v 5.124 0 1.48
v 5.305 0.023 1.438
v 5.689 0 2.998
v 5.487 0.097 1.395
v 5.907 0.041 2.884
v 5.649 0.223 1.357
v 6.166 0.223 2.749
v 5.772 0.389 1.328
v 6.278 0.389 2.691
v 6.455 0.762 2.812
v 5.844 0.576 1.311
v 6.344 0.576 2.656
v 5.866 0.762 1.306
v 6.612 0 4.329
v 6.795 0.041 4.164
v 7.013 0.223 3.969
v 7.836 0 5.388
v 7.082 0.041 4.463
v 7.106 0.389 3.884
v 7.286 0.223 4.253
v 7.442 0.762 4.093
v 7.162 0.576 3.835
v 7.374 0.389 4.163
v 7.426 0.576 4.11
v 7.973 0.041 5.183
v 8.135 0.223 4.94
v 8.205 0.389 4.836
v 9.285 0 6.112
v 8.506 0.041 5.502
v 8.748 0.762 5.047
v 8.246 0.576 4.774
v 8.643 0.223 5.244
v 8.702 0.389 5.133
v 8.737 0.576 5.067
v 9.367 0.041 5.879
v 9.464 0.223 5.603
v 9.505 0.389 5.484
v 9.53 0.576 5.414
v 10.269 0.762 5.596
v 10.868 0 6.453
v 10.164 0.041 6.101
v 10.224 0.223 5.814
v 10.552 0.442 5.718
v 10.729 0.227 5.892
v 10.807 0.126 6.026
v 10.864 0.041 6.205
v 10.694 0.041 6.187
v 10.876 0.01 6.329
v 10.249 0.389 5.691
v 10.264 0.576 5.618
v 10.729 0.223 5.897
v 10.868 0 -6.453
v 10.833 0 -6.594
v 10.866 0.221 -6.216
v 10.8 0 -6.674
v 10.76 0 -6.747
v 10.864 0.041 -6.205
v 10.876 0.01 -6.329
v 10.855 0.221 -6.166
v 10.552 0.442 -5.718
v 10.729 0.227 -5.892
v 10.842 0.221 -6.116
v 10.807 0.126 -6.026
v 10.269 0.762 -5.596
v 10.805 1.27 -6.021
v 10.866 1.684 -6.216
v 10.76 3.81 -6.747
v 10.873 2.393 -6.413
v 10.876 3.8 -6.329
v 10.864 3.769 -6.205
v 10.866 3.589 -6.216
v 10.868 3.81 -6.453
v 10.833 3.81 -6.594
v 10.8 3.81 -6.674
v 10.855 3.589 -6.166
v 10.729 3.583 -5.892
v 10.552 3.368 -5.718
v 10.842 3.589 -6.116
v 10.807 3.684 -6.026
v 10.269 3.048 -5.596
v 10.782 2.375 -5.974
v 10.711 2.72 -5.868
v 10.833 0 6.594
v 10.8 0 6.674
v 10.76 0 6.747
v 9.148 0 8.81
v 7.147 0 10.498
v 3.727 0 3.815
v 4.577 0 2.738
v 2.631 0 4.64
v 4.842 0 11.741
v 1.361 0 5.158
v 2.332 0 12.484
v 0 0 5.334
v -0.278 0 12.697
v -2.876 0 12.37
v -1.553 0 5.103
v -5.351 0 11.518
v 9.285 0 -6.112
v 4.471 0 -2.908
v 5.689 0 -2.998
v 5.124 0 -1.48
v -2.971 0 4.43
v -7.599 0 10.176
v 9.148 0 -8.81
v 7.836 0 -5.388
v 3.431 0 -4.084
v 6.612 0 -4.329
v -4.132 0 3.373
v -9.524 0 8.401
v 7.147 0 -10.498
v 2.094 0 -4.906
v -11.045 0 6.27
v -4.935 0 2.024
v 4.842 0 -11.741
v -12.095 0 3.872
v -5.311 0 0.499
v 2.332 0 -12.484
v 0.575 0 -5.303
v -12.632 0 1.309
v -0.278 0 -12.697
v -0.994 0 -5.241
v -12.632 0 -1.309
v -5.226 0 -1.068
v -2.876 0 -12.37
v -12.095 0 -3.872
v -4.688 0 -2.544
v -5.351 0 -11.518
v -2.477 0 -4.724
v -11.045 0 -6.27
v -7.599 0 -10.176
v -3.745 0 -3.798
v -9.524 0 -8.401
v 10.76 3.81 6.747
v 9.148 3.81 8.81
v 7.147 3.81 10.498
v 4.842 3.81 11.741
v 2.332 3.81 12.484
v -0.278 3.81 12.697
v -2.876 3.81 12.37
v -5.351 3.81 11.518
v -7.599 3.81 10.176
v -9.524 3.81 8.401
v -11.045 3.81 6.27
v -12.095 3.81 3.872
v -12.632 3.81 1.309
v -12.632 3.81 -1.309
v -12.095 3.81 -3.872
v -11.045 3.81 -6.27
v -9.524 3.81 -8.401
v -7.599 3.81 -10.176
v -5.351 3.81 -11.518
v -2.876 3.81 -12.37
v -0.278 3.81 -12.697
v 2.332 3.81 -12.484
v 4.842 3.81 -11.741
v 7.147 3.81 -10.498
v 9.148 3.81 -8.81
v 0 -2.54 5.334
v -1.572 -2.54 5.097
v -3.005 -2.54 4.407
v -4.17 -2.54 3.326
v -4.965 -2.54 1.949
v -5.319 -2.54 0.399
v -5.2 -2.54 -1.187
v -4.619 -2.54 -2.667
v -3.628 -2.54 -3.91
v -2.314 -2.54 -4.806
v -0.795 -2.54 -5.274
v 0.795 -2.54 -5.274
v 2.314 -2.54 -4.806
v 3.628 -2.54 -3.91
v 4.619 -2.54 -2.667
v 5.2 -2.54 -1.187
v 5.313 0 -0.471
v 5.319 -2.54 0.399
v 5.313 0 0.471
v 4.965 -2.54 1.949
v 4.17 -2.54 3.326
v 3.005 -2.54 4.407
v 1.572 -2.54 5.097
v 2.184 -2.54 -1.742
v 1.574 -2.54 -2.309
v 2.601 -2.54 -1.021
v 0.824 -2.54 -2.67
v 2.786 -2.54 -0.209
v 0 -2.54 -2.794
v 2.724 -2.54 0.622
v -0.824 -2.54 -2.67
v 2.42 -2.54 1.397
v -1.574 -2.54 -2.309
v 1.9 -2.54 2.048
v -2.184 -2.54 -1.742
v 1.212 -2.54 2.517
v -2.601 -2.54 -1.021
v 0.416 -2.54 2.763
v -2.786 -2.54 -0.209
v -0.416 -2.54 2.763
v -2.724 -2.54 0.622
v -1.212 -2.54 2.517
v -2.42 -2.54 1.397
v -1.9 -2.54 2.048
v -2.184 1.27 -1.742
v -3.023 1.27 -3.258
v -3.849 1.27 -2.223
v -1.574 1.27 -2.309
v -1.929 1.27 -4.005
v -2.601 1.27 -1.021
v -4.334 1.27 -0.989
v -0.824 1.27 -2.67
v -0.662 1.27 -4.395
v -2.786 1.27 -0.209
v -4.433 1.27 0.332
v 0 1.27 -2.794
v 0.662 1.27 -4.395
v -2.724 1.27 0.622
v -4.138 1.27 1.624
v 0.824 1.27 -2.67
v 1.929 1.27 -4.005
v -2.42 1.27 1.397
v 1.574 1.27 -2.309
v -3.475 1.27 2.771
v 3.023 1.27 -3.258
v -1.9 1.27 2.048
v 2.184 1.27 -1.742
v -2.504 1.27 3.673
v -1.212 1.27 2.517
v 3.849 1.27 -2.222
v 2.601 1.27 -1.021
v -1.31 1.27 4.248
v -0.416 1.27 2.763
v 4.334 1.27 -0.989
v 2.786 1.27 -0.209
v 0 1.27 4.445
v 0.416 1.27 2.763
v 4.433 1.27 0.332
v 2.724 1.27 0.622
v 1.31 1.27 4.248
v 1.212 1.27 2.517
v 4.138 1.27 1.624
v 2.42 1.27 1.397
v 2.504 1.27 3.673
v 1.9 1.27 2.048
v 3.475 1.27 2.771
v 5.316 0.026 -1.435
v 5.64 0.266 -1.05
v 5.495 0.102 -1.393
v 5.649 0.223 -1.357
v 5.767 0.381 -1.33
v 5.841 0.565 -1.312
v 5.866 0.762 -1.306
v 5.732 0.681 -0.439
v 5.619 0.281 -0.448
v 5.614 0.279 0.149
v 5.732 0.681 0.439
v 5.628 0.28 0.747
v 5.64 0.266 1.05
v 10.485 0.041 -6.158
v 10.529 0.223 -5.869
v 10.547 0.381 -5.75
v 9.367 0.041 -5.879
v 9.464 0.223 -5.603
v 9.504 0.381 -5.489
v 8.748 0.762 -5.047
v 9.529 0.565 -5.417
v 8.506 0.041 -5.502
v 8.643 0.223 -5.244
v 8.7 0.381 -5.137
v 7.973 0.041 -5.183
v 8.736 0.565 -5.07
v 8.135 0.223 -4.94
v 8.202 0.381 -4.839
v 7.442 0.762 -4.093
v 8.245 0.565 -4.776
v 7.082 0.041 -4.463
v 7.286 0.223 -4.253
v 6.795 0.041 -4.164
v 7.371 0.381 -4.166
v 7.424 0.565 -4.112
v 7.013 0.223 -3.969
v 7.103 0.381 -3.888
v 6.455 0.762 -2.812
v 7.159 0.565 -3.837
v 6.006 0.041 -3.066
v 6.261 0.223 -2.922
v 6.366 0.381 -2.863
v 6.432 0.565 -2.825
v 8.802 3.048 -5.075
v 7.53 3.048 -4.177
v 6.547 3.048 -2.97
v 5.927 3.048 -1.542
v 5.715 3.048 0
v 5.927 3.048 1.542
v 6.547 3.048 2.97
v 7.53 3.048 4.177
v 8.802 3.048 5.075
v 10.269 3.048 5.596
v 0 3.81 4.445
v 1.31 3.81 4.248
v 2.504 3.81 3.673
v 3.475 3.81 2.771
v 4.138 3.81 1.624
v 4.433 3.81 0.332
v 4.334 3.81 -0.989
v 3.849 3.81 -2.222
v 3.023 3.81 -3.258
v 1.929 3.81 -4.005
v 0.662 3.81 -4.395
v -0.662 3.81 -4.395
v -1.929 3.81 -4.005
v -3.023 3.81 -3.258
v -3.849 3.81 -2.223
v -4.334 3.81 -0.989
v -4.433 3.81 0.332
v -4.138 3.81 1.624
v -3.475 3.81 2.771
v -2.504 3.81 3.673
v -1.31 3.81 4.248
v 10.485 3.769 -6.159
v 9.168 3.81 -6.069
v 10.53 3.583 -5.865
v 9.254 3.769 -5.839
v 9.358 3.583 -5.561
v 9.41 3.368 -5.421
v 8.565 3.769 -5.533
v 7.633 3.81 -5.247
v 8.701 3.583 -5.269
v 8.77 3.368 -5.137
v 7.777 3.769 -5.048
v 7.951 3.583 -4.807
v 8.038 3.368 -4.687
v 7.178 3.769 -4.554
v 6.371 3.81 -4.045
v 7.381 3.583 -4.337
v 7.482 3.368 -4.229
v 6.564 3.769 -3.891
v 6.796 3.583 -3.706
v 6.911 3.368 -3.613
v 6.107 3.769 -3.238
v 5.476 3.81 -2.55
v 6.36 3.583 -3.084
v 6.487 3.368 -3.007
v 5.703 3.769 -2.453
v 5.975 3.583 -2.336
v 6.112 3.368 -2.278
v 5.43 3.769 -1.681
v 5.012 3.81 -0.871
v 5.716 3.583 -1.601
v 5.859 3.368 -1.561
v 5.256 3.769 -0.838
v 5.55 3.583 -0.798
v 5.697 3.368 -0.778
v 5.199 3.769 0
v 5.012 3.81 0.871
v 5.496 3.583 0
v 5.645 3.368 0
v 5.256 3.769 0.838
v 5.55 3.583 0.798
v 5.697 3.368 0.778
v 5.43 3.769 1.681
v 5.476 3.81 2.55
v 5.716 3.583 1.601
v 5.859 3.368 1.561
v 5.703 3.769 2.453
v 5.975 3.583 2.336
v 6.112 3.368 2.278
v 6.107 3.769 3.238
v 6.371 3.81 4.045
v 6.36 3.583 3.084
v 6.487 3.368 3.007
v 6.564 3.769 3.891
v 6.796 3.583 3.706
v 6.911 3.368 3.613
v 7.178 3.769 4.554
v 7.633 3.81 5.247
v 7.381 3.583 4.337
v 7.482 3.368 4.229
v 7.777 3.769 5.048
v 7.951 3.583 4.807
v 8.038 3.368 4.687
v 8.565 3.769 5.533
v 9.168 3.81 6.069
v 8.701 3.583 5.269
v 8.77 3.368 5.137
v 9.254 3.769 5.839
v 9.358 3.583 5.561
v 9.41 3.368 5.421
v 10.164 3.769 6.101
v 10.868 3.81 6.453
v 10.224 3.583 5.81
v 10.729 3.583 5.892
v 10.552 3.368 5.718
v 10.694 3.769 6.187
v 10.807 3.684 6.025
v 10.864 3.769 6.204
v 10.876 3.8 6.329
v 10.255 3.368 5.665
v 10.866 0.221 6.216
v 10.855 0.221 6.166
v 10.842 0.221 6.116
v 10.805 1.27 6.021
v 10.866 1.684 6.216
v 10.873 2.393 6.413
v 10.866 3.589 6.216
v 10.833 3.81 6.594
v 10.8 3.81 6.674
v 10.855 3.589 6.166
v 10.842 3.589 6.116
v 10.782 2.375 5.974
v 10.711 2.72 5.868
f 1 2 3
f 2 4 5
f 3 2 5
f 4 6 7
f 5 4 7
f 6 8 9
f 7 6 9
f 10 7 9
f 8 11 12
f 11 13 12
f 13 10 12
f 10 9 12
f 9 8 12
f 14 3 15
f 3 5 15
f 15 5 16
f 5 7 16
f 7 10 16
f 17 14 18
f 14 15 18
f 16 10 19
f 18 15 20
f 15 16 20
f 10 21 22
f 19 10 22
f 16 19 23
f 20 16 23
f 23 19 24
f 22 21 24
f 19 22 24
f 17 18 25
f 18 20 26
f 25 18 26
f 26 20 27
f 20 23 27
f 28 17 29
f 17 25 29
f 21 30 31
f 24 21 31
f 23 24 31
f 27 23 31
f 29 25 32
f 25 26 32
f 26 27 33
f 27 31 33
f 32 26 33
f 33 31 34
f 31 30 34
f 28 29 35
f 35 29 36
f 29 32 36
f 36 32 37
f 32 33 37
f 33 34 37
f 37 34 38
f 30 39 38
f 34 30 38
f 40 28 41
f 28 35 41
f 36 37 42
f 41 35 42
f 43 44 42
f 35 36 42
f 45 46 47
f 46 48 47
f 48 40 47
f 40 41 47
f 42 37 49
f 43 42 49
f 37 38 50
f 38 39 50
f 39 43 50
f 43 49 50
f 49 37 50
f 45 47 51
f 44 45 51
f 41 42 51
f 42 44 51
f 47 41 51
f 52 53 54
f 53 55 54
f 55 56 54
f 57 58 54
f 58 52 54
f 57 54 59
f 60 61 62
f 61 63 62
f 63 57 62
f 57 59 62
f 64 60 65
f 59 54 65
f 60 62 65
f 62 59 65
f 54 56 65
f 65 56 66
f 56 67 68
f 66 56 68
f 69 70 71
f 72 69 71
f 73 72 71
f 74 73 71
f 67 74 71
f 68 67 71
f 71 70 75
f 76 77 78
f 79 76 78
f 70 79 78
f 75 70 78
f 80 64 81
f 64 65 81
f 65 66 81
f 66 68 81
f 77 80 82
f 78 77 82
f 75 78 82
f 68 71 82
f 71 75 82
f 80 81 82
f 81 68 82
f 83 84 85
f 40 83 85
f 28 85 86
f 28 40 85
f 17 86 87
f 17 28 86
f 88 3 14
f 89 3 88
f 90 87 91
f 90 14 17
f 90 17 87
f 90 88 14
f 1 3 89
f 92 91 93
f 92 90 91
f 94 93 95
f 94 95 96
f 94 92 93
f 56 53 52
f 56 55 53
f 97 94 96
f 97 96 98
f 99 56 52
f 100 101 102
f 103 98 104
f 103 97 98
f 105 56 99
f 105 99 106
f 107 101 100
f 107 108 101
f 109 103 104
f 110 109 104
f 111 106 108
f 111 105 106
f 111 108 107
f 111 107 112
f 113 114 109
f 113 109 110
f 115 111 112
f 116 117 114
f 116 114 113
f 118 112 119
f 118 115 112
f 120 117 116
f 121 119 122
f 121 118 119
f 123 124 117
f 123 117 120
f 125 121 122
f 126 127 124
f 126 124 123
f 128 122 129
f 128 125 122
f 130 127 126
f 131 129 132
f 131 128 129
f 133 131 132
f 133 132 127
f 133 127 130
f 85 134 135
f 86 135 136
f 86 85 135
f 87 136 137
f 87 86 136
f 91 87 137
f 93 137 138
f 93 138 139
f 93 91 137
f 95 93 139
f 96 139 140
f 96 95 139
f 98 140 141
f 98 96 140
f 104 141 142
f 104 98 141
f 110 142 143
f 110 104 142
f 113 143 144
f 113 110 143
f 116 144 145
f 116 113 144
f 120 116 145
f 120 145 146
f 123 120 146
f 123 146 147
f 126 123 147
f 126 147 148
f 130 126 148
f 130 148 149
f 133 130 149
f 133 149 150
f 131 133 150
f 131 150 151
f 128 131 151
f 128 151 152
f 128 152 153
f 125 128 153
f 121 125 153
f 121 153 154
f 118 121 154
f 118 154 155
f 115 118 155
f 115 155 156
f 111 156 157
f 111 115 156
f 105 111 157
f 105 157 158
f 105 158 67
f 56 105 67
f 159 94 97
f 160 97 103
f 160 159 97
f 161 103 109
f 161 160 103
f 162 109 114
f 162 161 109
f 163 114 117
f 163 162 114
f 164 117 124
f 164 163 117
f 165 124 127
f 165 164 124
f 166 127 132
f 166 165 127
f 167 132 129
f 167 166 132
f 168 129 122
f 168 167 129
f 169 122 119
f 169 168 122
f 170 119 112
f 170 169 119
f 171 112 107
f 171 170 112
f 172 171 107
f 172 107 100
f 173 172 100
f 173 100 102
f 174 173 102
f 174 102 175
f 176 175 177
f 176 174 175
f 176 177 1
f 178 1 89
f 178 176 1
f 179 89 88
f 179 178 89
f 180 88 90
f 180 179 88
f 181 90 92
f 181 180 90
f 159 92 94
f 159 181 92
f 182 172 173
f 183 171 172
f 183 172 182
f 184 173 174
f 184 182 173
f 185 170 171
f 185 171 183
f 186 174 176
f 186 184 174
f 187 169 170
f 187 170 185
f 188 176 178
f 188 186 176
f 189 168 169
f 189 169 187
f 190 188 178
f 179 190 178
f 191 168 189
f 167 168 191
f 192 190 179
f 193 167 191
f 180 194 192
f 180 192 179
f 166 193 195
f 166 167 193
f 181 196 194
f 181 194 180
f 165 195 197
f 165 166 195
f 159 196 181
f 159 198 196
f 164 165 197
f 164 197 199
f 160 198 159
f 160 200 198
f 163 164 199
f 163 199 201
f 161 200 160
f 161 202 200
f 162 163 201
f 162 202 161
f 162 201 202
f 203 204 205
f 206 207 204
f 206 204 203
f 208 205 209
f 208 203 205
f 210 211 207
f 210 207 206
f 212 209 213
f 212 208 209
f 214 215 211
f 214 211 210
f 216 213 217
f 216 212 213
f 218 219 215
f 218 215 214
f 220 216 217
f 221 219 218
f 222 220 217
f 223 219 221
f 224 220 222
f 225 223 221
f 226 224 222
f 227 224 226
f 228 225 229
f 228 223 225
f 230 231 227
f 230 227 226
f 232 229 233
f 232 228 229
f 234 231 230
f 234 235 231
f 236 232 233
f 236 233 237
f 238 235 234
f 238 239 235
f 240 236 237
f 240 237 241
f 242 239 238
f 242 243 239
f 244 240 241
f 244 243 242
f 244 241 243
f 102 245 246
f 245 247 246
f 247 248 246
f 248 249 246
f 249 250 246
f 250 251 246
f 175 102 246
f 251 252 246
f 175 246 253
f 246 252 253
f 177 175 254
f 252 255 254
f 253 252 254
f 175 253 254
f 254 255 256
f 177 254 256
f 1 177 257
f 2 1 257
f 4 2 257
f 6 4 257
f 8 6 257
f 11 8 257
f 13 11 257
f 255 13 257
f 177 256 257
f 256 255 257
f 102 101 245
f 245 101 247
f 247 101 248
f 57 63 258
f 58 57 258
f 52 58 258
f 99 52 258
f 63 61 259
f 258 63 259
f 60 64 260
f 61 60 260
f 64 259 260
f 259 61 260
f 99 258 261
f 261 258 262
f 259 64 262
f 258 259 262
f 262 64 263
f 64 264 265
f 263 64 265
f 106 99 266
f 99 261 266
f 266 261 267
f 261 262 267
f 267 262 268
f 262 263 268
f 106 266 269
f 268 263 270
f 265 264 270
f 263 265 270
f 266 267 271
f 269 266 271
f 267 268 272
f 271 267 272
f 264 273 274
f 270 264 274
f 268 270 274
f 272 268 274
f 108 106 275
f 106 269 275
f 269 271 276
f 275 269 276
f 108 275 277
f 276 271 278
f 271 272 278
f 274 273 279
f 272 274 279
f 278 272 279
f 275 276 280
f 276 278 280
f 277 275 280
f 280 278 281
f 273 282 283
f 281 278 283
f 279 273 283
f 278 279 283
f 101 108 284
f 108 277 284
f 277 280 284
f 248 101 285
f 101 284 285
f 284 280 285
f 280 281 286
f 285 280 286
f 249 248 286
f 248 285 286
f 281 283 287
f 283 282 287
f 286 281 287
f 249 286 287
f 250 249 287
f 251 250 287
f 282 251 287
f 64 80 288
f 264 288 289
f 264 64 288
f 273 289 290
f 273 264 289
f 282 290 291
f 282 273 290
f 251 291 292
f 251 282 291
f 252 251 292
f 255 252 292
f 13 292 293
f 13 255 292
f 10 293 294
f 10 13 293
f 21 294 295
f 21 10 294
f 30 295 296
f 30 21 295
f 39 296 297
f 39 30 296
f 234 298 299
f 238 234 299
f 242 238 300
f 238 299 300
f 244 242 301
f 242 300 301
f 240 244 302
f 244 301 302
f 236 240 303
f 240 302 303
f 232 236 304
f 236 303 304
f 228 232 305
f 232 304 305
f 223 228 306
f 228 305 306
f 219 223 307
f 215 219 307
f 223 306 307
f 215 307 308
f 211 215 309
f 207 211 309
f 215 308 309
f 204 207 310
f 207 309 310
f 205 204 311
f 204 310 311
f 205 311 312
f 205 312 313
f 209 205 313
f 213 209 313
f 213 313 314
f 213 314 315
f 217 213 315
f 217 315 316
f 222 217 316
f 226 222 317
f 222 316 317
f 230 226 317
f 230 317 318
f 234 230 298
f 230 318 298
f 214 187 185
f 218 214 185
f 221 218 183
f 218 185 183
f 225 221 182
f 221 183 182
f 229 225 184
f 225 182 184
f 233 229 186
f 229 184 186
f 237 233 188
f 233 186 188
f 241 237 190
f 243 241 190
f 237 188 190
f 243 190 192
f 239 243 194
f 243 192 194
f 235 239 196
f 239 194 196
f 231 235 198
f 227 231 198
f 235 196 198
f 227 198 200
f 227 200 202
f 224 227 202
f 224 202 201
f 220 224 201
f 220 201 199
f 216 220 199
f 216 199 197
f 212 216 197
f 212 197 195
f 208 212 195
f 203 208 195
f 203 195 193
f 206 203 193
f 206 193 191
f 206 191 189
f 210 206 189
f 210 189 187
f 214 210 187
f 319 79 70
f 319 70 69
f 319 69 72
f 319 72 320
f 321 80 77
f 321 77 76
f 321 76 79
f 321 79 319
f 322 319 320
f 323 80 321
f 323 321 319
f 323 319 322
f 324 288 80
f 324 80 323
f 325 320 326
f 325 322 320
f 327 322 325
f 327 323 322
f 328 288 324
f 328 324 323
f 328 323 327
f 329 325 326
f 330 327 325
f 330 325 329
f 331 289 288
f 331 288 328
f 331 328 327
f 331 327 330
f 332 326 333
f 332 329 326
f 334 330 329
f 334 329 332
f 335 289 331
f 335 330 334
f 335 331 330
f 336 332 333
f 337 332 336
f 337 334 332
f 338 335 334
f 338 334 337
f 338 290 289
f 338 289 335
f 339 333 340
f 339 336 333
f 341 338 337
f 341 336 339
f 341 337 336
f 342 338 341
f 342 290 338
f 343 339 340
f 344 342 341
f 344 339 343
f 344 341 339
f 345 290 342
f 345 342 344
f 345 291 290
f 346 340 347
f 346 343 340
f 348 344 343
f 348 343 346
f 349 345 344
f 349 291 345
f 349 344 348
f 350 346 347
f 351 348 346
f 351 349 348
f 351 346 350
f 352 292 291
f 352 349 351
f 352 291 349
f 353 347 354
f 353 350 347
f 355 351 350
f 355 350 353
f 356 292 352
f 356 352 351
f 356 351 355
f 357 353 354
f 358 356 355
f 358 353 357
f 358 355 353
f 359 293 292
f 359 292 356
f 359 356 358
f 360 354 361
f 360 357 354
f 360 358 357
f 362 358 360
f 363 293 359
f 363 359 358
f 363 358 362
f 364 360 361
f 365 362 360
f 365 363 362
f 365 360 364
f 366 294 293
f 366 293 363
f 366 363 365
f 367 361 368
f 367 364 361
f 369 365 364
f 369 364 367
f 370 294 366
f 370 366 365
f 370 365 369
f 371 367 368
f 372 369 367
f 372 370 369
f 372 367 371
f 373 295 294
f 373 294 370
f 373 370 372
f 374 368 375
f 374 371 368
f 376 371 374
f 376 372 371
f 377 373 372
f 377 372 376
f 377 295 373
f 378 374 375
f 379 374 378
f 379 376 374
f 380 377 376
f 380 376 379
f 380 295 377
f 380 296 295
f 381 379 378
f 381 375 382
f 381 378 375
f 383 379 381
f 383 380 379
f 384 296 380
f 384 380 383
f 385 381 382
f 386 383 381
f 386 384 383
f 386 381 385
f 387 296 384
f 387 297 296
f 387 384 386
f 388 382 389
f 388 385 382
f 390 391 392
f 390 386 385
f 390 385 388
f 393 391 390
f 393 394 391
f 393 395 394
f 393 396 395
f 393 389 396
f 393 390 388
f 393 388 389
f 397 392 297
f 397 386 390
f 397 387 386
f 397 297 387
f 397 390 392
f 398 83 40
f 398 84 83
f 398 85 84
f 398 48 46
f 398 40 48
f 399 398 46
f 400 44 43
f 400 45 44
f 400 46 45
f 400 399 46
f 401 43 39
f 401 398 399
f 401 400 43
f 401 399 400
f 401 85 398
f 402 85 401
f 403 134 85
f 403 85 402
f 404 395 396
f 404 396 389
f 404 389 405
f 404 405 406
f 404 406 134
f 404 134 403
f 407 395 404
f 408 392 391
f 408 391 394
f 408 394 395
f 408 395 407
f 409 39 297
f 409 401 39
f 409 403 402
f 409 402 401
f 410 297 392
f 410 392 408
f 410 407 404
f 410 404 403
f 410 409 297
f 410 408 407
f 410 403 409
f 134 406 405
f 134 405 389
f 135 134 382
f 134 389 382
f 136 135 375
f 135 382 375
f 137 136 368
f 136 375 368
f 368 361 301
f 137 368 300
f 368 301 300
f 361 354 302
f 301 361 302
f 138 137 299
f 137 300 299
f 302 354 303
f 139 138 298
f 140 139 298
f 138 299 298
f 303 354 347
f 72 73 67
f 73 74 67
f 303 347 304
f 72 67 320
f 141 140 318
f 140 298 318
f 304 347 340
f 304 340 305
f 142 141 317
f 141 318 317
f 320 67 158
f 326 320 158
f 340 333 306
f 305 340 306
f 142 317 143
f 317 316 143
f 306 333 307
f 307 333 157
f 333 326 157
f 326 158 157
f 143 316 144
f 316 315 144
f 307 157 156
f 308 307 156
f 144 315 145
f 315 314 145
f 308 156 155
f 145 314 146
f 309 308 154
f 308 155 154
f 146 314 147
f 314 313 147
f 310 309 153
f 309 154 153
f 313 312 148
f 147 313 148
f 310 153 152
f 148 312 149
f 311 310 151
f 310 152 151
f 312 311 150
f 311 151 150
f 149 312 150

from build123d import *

# Parameters (mm, degrees)
SKETCH1_R           = 2.794
BOSS_EXTRUDE1_DEPTH = 3.81
SKETCH3_R           = 4.445
CUT_EXTRUDE1_DEPTH  = 2.54
BOSS_EXTRUDE2_START = 2.54
SKETCH4_R           = 5.334
SKETCH4_R_2         = 2.794
BOSS_EXTRUDE2_DEPTH = 2.54
FILLET2_R           = 0.762


with BuildPart() as part:
    # Sketch1 → Boss-Extrude1 (new body)
    with BuildSketch(Plane(origin=(0, 0, 0), x_dir=(1, 0, 0), z_dir=(0, 1, 0))):
        with BuildLine():
            ThreePointArc((11.341805556, 5.714319447), (5.715, 0), (11.341805556, -5.714319447))
            ThreePointArc((11.341805556, -5.714319447), (-12.7, 0), (11.341805556, 5.714319447))
        make_face()
        with Locations(Location((0, 0, 0), (0, 0, 90))):
            Circle(SKETCH1_R, mode=Mode.SUBTRACT)
    extrude(amount=BOSS_EXTRUDE1_DEPTH)

    # Sketch3 → Cut-Extrude1 (cut)
    with BuildSketch(Plane(origin=(0, 3.81, 0), x_dir=(1, 0, 0), z_dir=(0, 1, 0))):
        with Locations(Location((0, 0, 0), (0, 0, 270))):
            Circle(SKETCH3_R)
    extrude(amount=-CUT_EXTRUDE1_DEPTH, mode=Mode.SUBTRACT)

    # Sketch4 → Boss-Extrude2 (add)
    with BuildSketch(Plane.XZ.offset(BOSS_EXTRUDE2_START)):
        with Locations(Location((0, 0, 0), (0, 0, 90))):
            Circle(SKETCH4_R)
        with Locations(Location((0, 0, 0), (0, 0, 270))):
            Circle(SKETCH4_R_2, mode=Mode.SUBTRACT)
    extrude(amount=-BOSS_EXTRUDE2_DEPTH)

    # Fillet2
    fillet2_edges = [part.edges().sort_by_distance(p)[0] for p in [
        (5.715, 3.81, 0),
        (5.715, 0, 0),
        (11.341805556, 1.905, 5.714319447),
        (11.341805556, 1.905, -5.714319447),
    ]]
    fillet(fillet2_edges, radius=FILLET2_R)


solid = part.part
